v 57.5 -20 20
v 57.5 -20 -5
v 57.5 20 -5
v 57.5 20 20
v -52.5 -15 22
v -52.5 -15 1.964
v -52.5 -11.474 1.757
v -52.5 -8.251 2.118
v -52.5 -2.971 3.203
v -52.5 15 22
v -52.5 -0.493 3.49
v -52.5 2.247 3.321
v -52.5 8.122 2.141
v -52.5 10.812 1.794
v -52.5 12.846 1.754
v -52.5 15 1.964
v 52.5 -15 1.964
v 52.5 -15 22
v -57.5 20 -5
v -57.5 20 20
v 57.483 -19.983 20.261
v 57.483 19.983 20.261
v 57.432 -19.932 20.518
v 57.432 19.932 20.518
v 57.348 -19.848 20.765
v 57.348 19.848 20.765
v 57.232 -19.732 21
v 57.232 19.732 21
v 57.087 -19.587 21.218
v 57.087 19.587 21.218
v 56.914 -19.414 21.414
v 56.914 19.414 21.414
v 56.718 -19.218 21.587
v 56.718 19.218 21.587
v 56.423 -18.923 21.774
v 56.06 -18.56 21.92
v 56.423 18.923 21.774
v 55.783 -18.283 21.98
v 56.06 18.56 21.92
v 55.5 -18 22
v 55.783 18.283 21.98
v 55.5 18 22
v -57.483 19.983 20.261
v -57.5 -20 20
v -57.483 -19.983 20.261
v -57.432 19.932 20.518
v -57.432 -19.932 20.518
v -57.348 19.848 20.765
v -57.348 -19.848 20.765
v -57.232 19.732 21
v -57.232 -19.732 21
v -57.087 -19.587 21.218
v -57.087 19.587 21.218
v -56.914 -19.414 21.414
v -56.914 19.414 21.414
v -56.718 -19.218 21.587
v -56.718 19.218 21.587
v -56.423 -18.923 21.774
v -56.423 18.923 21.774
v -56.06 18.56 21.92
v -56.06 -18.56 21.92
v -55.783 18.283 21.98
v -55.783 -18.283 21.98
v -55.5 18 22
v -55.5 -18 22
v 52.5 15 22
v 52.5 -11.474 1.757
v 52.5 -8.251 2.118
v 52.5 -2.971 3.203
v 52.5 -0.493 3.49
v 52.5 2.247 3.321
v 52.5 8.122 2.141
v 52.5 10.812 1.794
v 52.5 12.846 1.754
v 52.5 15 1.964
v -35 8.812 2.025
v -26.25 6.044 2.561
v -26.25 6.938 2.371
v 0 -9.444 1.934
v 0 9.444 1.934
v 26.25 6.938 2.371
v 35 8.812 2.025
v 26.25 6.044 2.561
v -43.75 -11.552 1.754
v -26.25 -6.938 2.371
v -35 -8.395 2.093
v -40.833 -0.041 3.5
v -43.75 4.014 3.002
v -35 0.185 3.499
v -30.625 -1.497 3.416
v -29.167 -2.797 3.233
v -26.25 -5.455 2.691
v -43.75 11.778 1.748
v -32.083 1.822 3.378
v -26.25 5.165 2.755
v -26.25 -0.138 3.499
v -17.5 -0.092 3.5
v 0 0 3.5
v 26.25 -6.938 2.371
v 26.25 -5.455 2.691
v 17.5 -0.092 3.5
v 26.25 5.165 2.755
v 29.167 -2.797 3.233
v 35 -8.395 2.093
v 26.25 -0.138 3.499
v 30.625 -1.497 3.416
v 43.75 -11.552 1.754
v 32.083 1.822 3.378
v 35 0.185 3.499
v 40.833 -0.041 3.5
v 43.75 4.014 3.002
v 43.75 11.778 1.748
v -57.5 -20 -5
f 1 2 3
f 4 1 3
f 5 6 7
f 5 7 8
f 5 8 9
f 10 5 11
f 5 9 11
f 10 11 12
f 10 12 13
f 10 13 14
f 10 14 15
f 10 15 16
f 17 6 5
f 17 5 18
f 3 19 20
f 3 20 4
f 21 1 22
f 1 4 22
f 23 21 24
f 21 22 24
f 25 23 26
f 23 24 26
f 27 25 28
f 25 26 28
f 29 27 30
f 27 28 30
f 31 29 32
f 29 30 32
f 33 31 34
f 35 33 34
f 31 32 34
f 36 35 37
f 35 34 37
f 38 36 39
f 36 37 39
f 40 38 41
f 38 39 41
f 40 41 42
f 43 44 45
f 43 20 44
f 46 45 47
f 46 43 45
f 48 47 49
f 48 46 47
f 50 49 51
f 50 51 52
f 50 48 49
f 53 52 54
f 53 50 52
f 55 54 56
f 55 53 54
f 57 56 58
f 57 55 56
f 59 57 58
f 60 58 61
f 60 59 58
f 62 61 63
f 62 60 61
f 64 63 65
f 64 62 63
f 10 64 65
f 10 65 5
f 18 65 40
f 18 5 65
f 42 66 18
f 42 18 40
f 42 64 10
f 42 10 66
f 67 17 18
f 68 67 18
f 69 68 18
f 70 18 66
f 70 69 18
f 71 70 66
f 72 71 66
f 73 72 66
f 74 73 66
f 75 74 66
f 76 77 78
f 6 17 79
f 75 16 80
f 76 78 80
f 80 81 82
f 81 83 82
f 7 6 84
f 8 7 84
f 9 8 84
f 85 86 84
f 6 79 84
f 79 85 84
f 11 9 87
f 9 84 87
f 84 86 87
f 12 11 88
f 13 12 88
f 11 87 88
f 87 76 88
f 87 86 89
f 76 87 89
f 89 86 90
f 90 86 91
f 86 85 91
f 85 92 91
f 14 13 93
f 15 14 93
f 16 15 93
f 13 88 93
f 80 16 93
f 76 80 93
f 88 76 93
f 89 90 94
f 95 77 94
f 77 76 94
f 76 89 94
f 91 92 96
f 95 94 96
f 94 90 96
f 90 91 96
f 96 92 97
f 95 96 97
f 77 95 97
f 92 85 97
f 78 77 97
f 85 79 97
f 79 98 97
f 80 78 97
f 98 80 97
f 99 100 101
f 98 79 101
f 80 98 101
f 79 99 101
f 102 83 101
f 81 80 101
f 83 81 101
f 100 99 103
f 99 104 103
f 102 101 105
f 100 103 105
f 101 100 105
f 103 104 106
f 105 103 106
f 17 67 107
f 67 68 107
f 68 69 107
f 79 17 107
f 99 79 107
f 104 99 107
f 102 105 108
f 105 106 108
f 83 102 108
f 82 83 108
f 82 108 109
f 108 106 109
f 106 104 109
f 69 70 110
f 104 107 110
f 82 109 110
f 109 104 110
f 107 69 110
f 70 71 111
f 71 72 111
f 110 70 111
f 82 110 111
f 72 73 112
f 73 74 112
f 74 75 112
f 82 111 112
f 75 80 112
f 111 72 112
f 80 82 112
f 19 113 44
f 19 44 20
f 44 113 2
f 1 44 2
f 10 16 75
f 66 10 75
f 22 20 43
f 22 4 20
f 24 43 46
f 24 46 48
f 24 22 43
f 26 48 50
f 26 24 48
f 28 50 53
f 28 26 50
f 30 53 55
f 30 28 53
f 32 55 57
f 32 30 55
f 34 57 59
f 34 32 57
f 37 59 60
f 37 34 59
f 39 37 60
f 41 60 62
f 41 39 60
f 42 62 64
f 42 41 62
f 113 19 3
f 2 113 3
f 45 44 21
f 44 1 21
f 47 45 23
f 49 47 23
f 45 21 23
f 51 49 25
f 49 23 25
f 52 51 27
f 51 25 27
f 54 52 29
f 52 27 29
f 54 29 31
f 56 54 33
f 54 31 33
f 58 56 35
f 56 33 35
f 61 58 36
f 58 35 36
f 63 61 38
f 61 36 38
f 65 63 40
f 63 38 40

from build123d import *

# Parameters (mm, degrees)
F0_W     = 115
F0_H     = 40
F0_W_2   = 105
F0_H_2   = 30
F1_DEPTH = 5
F2_DEPTH = 22
F3_R     = 2
F5_DEPTH = 105


with BuildPart() as f1:
    # F0 (on Top) → F1 (new body)
    with BuildSketch(Plane.XY):
        Rectangle(F0_W, F0_H)
        Rectangle(F0_W_2, F0_H_2, mode=Mode.SUBTRACT)
        Rectangle(F0_W_2, F0_H_2)
    extrude(amount=-F1_DEPTH)

    # F0 (on Top) → F2 (join)
    with BuildSketch(Plane.XY):
        Rectangle(F0_W, F0_H)
        Rectangle(F0_W_2, F0_H_2, mode=Mode.SUBTRACT)
    extrude(amount=F2_DEPTH)

    # F3
    f3_edges = [f1.edges().sort_by_distance(p)[0] for p in [
        (0, 20, 22),
        (-57.5, 0, 22),
        (0, -20, 22),
        (57.5, 0, 22),
    ]]
    fillet(f3_edges, radius=F3_R)

    # F4 (on face) → F5 (join, through all)
    with BuildSketch(Plane(origin=(52.5, 0, 0), x_dir=(0, -1, 0), z_dir=(-1, 0, 0))):
        with BuildLine():
            Line((-15, 1.9643241272), (-15, 0))
            Line((-15, 0), (15, 0))
            Line((15, 0), (15, 1.9643241272))
            add(Edge.make_bspline(
                [(15, 1.9643241272), (9, 1), (0, 6), (-9, 1), (-15, 1.9643241272)],
                knots=[0, 0, 0, 0, 0.5, 1, 1, 1, 1], degree=3))
        make_face()
    extrude(amount=F5_DEPTH)


solid = f1.part
